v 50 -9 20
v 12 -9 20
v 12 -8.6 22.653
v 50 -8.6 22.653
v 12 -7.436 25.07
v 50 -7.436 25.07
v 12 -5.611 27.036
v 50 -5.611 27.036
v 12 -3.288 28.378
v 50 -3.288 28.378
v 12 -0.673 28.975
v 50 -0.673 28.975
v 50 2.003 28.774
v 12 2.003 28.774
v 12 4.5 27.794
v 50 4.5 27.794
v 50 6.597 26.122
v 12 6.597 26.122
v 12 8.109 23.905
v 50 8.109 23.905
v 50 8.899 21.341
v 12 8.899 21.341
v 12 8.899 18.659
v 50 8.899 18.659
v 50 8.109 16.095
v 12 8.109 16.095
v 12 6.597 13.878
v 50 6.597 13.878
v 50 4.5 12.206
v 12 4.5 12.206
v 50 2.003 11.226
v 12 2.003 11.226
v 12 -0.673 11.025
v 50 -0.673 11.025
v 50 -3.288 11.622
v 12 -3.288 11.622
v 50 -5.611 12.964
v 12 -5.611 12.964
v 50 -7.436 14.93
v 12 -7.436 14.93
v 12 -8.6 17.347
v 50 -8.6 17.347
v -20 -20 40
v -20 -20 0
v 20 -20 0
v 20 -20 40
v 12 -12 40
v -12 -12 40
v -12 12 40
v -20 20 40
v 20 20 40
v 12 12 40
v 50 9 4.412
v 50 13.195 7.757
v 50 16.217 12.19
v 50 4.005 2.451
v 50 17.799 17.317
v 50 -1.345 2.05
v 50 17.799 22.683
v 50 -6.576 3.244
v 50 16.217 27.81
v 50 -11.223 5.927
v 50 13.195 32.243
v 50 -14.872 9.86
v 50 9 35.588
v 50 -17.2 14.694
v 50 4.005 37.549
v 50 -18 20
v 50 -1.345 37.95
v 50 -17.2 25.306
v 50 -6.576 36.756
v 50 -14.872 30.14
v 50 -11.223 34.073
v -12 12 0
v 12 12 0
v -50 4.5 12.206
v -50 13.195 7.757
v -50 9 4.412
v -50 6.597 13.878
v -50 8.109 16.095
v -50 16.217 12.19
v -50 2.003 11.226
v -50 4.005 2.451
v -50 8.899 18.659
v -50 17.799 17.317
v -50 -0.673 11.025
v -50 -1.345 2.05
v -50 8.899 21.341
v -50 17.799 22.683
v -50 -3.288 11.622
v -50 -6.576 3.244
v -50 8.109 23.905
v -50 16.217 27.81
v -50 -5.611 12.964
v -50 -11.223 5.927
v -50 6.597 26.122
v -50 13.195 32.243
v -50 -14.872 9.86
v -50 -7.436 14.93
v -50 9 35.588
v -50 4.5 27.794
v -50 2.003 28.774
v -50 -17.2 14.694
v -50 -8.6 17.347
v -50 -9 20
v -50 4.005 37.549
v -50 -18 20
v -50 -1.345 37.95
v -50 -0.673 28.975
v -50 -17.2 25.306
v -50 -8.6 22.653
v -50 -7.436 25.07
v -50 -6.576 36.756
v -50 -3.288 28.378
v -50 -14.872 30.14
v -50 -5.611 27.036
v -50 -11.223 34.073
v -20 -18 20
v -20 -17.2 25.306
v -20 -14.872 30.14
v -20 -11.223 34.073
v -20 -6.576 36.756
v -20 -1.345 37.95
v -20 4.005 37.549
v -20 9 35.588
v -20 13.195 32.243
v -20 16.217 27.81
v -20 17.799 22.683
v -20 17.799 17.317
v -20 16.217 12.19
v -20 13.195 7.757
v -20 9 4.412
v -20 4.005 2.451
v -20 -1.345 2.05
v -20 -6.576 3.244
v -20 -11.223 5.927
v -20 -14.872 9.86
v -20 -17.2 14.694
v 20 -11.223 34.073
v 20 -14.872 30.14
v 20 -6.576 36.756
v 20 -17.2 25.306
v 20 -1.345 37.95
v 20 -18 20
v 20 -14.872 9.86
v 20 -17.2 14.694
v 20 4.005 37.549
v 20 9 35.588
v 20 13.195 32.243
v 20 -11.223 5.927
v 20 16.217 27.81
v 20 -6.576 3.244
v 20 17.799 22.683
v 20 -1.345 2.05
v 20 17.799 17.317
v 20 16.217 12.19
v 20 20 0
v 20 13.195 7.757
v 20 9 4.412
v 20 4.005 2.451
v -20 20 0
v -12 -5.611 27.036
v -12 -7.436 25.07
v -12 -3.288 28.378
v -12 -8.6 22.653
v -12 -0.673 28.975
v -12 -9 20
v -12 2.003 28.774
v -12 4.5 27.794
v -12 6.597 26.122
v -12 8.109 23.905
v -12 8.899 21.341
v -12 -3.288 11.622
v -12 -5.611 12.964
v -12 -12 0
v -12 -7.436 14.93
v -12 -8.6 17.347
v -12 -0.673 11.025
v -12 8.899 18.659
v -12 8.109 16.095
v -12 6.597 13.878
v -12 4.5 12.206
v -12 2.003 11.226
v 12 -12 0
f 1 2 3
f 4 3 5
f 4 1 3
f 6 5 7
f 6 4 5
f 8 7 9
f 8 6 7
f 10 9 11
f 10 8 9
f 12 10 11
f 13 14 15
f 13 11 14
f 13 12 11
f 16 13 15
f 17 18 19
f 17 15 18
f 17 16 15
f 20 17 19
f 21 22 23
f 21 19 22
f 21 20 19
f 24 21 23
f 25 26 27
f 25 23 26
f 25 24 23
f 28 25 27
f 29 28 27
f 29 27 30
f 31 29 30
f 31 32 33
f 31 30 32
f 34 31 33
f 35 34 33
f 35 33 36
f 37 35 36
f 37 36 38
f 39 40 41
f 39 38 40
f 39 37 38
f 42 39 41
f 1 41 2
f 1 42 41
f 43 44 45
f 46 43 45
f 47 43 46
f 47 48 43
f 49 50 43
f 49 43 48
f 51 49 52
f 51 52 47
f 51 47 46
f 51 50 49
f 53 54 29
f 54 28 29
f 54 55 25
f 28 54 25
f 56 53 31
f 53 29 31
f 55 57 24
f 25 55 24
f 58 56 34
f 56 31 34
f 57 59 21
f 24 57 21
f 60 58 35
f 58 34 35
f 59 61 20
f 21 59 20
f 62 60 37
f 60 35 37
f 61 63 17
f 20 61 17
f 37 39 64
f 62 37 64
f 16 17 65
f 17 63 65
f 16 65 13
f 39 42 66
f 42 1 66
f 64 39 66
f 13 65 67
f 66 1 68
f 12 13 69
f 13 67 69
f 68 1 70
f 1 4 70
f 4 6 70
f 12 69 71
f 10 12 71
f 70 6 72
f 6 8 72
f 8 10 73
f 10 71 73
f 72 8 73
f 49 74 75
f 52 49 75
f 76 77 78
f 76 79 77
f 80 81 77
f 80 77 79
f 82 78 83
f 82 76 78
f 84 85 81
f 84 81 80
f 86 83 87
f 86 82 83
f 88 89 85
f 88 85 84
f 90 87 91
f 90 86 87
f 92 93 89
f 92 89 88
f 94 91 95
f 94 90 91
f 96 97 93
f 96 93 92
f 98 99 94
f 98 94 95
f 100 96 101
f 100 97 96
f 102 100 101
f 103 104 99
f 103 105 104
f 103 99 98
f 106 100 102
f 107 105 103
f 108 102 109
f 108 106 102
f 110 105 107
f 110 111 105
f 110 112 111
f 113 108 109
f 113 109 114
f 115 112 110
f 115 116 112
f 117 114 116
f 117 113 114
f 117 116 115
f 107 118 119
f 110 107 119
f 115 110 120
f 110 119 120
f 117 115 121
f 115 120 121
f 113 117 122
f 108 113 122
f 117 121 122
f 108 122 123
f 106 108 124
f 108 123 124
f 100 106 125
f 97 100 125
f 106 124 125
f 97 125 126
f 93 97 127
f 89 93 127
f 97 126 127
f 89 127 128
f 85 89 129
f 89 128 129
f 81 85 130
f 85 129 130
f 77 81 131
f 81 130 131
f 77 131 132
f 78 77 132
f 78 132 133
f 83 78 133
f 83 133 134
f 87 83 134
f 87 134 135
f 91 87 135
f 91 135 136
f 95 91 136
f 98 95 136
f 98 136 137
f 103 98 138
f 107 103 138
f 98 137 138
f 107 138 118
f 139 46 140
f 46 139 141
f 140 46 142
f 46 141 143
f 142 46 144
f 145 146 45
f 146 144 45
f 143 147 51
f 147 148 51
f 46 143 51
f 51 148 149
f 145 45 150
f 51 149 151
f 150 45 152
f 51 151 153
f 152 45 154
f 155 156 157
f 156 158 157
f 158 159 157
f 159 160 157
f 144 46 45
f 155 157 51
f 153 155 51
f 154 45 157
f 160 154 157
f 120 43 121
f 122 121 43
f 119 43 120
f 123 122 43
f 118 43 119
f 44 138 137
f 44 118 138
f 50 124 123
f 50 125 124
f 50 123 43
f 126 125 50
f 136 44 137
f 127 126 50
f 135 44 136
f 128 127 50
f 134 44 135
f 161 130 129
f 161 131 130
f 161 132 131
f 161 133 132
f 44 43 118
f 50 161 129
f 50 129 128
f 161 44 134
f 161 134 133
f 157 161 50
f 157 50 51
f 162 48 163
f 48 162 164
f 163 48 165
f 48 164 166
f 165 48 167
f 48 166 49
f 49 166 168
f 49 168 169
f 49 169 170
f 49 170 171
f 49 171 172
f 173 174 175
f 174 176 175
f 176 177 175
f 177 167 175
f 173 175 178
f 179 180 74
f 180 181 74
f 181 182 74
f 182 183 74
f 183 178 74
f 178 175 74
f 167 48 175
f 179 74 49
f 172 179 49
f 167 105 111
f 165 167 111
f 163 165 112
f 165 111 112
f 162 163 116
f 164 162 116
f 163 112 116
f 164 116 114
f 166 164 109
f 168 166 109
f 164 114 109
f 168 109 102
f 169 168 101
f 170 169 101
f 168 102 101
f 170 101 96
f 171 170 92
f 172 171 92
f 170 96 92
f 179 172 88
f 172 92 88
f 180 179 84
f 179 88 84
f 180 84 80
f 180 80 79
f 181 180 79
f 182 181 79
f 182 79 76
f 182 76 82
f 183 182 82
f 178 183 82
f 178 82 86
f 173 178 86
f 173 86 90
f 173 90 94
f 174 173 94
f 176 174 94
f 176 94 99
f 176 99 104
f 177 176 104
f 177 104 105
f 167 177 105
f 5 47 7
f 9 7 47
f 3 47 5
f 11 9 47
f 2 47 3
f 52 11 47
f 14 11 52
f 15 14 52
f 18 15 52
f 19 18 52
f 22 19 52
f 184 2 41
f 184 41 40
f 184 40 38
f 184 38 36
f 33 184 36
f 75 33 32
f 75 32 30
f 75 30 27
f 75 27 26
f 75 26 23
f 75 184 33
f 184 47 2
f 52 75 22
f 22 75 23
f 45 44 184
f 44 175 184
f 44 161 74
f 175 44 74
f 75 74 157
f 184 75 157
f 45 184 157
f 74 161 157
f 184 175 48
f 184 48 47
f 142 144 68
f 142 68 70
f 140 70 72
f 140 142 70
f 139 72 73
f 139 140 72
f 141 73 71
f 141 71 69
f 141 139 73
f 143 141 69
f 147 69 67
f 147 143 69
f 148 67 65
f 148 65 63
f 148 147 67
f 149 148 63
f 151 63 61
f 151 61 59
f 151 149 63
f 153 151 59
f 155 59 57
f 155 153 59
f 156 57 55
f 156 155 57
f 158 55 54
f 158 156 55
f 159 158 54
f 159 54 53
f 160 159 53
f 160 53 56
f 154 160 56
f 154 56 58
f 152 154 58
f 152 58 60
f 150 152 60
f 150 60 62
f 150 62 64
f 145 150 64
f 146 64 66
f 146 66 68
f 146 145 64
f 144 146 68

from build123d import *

# Parameters (mm, degrees)
SKETCH1_W           = 40
SKETCH1_H           = 40
SKETCH1_W_2         = 24
SKETCH1_H_2         = 24
BOSS_EXTRUDE1_DEPTH = 40
SKETCH2_R           = 18
BOSS_EXTRUDE3_DEPTH = 30
SKETCH3_R           = 9
CUT_EXTRUDE1_DEPTH  = 62


with BuildPart() as part:
    # Sketch1 → Boss-Extrude1 (new body)
    with BuildSketch(Plane.XY):
        Rectangle(SKETCH1_W, SKETCH1_H)
        Rectangle(SKETCH1_W_2, SKETCH1_H_2, mode=Mode.SUBTRACT)
    extrude(amount=BOSS_EXTRUDE1_DEPTH)

    # Sketch2 → Boss-Extrude3 (add)
    with BuildSketch(Plane.ZY.offset(20)):
        with Locations(Location((20, 0, 0), (0, 0, 270))):
            Circle(SKETCH2_R)
    boss_extrude3 = extrude(amount=BOSS_EXTRUDE3_DEPTH)

    # Sketch3 → Cut-Extrude1 (cut)
    with BuildSketch(Plane.ZY.offset(50)):
        with Locations(Location((20, 0, 0), (0, 0, 270))):
            Circle(SKETCH3_R)
    cut_extrude1 = extrude(amount=-CUT_EXTRUDE1_DEPTH, mode=Mode.SUBTRACT)

    # Mirror1: Boss-Extrude3, Cut-Extrude1 across plane
    add(boss_extrude3.mirror(Plane(origin=(0, 0, 0), x_dir=(0, 0, 1), z_dir=(1, 0, 0))))
    add(cut_extrude1.mirror(Plane(origin=(0, 0, 0), x_dir=(0, 0, 1), z_dir=(1, 0, 0))), mode=Mode.SUBTRACT)


solid = part.part
